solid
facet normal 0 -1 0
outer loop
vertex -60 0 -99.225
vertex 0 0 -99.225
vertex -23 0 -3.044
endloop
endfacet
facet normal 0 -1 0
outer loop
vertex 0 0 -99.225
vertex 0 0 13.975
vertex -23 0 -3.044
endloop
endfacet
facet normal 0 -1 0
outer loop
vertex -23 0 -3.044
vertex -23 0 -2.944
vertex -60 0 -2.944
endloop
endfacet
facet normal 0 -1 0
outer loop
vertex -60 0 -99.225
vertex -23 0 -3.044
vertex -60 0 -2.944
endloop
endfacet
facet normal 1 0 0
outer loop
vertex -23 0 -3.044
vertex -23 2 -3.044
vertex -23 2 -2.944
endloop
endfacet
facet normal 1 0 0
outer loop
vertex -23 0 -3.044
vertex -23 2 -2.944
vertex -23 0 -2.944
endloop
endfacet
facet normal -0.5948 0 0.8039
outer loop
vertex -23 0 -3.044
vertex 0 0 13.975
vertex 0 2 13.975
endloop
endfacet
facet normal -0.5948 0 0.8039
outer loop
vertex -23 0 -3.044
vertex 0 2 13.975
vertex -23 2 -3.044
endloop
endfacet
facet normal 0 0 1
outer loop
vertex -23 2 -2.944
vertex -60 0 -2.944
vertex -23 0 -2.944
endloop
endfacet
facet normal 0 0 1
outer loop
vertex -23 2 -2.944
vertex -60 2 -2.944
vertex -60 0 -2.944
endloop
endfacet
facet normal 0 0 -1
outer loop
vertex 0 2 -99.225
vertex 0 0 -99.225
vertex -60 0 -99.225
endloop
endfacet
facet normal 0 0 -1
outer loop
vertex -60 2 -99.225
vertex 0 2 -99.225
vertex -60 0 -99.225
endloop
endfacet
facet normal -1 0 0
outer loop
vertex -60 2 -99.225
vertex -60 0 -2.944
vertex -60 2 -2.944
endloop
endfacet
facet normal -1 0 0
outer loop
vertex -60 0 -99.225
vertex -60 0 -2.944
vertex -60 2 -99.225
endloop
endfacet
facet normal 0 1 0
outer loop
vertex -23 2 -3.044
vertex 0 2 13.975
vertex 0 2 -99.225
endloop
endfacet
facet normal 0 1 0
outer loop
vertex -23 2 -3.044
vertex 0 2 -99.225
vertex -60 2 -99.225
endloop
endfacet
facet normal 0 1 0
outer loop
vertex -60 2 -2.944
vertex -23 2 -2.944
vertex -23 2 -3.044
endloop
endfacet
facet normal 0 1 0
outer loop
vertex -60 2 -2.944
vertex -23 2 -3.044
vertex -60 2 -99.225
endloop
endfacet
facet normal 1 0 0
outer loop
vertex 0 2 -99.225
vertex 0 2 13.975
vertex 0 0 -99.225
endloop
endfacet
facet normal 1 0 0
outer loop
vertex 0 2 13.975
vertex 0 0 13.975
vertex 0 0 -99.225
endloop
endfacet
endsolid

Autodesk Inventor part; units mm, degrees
ref_plane "YZ Plane" through (0, 0, 0) normal (1, 0, 0) x (0, 1, 0)
ref_plane "XZ Plane" through (0, 0, 0) normal (0, 1, 0) x (-1, 0, 0)
ref_plane "XY Plane" through (0, 0, 0) normal (0, 0, 1) x (1, 0, 0)
sketch "Sketch1" plane through (0, 0, 0) normal (0, 1, 0) x (-1, 0, 0)
  line L0 (0, 13.9753) -> (0, -99.2247)
  line L1 (0, -99.2247) -> (60, -99.2247)
  line L2 (0, 13.9753) -> (23, -3.0438)
  line L3 (23, -3.0438) -> (60, -3.0438)
  line L4 (60, -3.0438) -> (60, -99.2247)
  point P0 (0, 0)
  dimension "d0" = 113.2
  dimension "d2" = 60
  dimension "d5" = 53.5
  dimension "d6" = 37
extrude "Extrusion1" add sketch "Sketch1" along normal blind 2
sketch "Sketch2" plane through (-60, 0, -3.0438) normal (0, 0, 1) x (1, 0, 0)
  line L0 (0, 0) -> (0, 2) projected
  line L1 (60, 0) -> (0, 0) projected
  line L2 (0, 2) -> (37, 2)
  line L3 (37, 2) -> (37, 0)
  line L4 (37, 0) -> (0, 0)
  line L5 (0, 0) -> (0, 2)
  line L6 (37, 0) -> (37, 2) projected
  point P0 (37, 1)
extrude "Extrusion2" add sketch "Sketch2" along normal blind 0.1
properties part number "tapa4_3DPrint"
